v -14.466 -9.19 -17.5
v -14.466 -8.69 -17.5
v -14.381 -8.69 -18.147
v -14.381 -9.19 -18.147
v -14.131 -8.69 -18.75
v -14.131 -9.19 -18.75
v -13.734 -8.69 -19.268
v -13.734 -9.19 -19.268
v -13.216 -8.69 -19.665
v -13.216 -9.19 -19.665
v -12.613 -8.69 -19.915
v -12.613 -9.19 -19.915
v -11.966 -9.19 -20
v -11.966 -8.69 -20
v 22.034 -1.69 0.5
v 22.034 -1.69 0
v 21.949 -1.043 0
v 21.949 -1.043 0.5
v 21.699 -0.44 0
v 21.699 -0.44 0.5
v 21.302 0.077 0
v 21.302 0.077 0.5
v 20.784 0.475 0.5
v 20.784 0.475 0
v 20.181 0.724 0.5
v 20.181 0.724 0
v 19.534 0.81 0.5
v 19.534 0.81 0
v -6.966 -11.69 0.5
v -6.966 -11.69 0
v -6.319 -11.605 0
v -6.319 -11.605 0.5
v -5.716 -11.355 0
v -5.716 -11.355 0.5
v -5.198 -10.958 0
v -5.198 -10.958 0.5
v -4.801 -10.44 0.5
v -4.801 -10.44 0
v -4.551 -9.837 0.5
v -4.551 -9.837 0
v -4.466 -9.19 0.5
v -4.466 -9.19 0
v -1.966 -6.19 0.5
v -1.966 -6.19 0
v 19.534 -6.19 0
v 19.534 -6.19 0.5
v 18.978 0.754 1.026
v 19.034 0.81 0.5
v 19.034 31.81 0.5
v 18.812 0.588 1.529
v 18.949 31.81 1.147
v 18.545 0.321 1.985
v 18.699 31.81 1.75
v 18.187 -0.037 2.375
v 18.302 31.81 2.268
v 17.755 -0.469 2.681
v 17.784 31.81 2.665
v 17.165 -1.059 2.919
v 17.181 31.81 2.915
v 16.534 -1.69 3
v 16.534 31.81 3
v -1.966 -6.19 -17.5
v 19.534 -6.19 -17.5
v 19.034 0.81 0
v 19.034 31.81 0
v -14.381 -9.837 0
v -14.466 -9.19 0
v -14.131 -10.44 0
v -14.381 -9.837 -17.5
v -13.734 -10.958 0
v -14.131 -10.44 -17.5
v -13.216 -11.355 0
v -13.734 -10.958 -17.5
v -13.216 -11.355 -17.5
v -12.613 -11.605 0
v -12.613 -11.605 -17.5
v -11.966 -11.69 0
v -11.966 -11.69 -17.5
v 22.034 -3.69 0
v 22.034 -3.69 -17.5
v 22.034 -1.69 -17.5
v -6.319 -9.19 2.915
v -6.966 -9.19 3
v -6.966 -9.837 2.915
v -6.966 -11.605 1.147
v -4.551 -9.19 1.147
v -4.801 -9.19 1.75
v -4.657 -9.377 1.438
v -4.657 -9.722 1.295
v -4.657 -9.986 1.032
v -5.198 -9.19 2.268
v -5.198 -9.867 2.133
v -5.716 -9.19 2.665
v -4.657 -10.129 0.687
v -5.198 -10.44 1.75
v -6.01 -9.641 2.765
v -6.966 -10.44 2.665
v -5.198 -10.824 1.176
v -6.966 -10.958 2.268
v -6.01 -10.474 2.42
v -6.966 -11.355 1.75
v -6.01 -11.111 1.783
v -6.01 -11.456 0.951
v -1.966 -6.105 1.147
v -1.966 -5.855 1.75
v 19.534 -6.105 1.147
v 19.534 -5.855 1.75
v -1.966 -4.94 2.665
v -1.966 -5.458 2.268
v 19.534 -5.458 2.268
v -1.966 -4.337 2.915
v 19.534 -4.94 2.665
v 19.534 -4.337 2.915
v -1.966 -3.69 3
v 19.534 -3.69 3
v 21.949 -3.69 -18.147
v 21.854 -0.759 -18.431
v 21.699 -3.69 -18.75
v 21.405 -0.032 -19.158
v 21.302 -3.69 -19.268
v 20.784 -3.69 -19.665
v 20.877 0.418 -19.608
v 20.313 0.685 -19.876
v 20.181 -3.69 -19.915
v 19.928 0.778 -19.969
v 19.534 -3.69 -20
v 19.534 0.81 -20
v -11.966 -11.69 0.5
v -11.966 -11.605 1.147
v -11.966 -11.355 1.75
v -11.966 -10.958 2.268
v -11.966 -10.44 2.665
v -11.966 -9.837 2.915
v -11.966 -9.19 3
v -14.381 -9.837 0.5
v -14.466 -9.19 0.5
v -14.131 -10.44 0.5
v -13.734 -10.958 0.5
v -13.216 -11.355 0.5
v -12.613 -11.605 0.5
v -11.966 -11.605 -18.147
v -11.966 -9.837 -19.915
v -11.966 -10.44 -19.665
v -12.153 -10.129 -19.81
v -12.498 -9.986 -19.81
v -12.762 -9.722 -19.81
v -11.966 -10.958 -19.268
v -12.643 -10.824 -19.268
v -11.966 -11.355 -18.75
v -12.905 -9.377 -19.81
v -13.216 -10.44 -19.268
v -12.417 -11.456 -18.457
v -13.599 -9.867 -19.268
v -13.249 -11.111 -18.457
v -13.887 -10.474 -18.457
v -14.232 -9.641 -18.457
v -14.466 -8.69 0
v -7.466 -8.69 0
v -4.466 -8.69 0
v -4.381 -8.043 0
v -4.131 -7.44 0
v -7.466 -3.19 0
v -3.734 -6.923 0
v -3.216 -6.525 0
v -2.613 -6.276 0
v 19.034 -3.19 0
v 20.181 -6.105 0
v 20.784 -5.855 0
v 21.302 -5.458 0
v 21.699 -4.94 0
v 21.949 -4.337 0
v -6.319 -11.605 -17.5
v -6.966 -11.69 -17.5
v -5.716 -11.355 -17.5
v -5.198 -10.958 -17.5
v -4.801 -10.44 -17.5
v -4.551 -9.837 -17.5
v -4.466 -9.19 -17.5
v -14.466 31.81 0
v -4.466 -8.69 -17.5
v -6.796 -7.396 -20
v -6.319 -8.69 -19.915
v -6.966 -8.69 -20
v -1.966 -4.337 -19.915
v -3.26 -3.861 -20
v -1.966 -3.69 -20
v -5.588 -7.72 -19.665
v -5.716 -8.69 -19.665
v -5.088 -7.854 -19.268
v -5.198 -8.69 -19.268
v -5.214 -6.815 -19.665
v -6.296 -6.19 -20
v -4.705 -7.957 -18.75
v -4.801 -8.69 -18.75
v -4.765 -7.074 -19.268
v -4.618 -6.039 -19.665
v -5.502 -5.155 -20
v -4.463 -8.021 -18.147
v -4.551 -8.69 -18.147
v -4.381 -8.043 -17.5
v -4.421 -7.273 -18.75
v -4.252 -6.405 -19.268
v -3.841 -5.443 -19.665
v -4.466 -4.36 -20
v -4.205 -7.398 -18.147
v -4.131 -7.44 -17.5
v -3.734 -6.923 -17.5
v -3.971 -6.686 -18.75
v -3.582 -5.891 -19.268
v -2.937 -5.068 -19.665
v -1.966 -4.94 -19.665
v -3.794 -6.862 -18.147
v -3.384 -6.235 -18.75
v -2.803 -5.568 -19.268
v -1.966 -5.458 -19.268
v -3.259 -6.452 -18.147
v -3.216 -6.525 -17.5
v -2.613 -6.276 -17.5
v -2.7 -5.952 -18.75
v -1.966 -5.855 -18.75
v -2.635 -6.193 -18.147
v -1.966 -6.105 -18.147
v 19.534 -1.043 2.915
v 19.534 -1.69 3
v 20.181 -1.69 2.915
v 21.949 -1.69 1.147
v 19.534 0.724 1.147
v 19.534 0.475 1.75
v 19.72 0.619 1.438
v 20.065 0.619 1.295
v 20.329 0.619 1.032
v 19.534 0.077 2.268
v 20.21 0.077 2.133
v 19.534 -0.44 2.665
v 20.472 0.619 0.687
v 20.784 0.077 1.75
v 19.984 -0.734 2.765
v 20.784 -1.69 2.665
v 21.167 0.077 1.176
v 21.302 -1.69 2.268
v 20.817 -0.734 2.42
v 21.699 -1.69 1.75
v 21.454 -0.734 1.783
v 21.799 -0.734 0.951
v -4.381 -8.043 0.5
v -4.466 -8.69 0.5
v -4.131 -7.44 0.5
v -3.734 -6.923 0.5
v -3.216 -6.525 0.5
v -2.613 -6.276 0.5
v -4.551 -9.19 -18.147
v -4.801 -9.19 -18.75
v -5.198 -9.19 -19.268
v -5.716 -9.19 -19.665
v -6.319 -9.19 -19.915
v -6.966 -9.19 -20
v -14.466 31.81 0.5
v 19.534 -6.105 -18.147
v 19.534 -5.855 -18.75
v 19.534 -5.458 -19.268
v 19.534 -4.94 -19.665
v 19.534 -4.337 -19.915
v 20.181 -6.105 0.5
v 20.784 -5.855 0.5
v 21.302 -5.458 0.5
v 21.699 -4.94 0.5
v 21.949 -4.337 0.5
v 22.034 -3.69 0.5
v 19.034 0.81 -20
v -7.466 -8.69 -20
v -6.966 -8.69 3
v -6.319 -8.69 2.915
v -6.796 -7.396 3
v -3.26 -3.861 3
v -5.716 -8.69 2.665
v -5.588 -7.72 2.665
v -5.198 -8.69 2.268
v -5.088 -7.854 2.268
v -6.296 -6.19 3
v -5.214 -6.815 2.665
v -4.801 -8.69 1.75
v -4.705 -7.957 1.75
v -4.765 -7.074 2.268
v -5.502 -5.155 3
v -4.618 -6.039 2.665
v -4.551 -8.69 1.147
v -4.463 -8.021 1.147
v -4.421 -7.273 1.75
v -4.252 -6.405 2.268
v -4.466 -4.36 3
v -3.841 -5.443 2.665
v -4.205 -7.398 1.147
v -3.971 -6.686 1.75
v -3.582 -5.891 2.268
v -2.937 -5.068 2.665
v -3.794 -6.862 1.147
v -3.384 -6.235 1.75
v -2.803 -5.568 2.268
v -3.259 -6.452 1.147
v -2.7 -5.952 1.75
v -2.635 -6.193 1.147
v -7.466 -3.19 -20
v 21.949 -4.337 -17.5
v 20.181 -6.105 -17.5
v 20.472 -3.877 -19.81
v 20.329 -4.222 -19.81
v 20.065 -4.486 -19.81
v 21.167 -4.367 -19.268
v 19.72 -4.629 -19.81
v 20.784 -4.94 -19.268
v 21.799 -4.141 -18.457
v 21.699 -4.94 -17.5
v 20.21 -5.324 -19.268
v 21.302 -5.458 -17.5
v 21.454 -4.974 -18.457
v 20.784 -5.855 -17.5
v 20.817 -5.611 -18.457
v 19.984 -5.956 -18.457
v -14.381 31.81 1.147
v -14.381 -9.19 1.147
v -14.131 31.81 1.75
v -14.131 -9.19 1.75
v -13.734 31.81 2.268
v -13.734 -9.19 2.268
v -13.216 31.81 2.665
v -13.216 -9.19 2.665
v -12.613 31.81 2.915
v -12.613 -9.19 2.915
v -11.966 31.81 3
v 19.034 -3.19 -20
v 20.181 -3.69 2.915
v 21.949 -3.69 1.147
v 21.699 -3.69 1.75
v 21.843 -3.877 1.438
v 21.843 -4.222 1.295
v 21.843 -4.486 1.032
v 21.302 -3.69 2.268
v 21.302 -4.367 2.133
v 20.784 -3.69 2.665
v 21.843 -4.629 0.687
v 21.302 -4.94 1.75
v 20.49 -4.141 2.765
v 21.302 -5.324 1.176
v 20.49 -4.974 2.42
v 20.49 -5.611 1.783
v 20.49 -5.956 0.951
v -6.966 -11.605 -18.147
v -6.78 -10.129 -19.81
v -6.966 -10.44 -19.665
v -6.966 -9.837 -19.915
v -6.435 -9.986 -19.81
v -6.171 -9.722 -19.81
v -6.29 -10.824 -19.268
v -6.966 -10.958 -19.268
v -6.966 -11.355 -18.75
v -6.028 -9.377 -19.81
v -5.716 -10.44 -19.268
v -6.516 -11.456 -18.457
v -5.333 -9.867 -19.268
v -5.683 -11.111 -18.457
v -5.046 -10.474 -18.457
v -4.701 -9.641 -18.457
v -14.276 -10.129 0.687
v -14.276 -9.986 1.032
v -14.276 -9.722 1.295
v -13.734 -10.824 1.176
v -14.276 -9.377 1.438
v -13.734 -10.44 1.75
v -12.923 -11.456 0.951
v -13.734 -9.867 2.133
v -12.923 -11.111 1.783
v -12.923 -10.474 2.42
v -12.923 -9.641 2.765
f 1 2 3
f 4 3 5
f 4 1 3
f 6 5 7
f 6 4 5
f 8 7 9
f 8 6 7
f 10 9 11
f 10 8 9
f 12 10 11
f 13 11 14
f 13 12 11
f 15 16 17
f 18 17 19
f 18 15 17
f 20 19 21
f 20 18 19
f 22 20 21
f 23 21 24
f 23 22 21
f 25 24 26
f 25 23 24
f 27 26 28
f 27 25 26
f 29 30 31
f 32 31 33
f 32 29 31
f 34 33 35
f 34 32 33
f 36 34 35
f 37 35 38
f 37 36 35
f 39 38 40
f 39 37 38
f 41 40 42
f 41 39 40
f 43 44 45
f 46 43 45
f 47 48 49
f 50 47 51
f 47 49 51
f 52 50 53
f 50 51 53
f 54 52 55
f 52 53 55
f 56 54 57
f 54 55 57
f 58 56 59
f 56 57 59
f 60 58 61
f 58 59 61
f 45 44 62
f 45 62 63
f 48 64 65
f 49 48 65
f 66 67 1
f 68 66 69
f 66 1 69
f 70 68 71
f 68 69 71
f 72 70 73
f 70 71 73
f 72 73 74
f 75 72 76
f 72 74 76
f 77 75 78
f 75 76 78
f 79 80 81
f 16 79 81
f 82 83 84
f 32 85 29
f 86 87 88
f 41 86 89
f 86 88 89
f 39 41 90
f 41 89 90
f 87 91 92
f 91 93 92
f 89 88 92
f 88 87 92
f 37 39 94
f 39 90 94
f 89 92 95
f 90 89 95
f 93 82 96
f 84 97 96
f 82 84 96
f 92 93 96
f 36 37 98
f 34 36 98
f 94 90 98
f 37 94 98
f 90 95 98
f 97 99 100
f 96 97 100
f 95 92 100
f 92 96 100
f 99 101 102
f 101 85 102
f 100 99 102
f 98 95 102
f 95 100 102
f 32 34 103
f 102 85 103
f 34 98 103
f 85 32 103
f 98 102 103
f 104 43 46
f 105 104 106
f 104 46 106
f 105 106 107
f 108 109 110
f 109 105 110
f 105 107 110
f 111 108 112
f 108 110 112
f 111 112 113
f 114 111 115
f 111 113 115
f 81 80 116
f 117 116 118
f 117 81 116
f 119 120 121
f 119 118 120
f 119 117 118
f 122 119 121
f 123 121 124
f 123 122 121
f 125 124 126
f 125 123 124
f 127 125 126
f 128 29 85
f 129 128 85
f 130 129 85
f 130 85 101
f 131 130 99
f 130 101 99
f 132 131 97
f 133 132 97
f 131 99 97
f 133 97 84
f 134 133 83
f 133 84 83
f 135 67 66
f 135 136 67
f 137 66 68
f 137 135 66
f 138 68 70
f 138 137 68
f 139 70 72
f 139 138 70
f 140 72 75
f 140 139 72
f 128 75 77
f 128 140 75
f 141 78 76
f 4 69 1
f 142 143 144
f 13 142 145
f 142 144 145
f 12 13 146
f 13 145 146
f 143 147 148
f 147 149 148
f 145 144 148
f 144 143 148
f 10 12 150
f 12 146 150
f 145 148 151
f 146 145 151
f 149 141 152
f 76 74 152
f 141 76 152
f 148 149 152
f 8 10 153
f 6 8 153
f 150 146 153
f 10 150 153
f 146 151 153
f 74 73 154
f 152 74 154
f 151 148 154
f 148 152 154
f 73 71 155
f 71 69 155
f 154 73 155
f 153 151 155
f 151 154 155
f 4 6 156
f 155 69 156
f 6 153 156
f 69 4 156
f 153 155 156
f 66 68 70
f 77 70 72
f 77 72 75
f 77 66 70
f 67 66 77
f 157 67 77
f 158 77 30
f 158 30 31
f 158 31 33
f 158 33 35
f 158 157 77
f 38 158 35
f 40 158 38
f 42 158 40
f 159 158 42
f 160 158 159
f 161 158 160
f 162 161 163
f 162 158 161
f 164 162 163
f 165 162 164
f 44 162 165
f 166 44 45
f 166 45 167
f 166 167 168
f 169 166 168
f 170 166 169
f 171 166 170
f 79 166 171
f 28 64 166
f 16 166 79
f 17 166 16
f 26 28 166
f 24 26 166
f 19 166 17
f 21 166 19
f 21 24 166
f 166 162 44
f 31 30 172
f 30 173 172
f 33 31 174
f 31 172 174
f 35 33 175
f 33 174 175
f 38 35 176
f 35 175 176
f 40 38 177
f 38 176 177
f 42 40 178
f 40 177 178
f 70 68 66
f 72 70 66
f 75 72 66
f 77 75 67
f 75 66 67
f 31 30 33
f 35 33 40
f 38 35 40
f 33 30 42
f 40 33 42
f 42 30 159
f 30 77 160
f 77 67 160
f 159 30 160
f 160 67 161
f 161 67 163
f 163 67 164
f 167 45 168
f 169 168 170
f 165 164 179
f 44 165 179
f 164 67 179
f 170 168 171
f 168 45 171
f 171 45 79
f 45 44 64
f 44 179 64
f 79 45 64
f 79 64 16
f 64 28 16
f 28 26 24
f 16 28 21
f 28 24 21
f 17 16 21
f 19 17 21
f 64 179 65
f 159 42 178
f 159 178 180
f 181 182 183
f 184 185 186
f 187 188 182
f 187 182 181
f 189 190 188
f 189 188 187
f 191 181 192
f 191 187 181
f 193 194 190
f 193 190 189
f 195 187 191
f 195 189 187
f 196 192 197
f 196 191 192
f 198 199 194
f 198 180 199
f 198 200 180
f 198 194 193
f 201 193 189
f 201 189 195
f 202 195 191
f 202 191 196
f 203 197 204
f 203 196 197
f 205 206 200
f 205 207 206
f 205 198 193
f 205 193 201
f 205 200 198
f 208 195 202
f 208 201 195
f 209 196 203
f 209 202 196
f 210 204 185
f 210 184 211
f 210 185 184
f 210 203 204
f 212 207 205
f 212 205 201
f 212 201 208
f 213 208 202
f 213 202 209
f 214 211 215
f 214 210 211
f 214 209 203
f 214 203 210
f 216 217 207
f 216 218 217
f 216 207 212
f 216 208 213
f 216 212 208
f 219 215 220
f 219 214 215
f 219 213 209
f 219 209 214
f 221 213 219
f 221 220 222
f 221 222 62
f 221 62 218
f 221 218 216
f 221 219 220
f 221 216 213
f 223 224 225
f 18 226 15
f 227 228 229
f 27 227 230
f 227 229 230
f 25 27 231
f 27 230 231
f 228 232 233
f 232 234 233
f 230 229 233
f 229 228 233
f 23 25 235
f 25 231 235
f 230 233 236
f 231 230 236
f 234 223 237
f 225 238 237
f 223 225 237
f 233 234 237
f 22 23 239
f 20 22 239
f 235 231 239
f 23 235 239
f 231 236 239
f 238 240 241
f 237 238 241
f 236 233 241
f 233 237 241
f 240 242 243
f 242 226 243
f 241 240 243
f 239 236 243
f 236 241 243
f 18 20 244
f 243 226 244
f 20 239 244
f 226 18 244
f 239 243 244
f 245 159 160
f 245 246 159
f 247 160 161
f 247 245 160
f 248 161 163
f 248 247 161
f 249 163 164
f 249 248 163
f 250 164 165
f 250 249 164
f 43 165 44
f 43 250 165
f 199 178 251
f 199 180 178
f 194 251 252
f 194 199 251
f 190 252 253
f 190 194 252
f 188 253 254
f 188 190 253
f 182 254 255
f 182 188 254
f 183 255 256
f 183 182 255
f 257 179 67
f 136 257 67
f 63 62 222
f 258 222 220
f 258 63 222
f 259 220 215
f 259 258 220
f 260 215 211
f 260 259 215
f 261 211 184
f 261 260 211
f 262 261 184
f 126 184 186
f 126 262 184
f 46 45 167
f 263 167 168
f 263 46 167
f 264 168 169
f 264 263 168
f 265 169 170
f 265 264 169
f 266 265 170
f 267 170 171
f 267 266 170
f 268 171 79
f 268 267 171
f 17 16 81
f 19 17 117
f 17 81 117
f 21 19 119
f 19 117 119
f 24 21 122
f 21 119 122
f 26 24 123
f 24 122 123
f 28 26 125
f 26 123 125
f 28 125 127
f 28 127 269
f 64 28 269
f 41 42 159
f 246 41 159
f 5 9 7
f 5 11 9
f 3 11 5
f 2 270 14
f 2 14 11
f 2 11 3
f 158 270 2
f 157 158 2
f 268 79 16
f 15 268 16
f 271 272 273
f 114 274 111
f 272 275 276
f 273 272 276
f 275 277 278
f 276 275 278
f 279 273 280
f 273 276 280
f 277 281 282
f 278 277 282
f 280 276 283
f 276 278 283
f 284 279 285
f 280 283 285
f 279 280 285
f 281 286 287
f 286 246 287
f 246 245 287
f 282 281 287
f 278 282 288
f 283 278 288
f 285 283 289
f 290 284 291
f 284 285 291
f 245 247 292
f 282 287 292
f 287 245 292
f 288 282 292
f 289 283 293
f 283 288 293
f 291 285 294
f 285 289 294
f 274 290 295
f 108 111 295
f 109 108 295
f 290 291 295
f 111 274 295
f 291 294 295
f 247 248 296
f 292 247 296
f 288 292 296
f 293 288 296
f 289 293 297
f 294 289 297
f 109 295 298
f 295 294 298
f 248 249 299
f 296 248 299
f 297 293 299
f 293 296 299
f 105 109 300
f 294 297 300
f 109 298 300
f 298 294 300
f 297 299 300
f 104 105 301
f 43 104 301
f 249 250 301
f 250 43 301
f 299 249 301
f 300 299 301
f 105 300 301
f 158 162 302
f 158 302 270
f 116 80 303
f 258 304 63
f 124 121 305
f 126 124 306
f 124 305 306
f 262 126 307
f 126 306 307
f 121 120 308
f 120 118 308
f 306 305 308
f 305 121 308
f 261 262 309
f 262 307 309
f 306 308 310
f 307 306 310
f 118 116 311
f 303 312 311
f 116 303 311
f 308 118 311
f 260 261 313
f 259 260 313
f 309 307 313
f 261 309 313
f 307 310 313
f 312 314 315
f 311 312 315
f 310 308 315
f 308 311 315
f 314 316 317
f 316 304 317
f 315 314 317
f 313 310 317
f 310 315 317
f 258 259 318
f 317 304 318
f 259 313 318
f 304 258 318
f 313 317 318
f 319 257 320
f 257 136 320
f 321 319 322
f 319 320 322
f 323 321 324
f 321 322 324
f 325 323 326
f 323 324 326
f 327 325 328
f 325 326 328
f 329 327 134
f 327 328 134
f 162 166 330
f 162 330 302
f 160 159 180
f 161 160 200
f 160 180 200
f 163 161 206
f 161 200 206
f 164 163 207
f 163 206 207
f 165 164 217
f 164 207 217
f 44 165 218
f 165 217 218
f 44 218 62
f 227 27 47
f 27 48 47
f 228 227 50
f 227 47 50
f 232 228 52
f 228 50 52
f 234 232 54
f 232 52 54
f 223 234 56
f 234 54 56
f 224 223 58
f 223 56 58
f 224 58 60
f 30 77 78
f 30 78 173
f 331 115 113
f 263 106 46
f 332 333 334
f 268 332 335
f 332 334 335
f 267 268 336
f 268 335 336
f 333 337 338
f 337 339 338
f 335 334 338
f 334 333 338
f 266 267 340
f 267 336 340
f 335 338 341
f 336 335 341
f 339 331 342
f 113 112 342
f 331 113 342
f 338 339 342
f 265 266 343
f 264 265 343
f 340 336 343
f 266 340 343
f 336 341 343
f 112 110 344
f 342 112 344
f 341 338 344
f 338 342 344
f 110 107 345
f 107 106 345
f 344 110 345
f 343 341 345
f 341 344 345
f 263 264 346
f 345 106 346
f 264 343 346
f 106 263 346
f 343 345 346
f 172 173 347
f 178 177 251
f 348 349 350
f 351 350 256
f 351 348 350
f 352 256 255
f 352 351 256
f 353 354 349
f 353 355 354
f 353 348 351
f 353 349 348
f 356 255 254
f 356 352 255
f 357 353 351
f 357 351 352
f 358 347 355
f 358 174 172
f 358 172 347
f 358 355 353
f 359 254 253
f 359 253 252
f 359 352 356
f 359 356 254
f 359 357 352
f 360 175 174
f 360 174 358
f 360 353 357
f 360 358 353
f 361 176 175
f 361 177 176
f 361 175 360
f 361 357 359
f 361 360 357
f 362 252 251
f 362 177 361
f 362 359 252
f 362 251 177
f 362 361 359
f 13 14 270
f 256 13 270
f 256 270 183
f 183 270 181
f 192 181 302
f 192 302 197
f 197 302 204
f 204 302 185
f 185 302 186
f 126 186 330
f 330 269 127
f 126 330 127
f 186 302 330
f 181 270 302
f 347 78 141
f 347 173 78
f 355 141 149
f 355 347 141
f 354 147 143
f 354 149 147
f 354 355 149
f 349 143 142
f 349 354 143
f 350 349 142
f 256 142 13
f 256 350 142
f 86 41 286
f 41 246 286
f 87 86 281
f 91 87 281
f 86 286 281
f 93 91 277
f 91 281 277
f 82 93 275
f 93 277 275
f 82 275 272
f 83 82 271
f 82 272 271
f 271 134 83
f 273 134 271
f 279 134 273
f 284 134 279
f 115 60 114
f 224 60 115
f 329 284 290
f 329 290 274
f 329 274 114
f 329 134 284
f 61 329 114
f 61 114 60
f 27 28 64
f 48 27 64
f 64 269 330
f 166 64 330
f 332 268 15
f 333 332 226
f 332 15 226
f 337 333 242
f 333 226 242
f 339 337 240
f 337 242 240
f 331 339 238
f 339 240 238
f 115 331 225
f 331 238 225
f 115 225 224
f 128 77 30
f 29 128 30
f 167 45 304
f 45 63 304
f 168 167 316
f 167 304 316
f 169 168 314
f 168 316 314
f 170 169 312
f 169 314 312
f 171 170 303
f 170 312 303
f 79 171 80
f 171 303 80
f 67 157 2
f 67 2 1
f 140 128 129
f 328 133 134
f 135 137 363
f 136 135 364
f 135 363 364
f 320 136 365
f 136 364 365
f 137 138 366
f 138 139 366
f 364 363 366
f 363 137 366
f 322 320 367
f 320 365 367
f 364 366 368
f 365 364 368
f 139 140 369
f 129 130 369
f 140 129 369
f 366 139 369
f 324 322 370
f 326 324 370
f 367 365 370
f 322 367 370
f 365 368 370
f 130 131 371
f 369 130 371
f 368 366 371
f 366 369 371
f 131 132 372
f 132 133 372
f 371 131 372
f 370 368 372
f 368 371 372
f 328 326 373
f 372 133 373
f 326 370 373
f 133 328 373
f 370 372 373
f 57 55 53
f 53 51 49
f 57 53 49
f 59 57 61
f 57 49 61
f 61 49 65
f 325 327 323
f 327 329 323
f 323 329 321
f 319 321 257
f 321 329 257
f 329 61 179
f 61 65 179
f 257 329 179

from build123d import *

# Parameters (mm, degrees)
F0_W     = 23.5
F0_H     = 3
F1_DEPTH = 3
F2_DEPTH = 20
F3_R     = 2.5
F3_2_R   = 2.5


with BuildPart() as f1:
    # F0 (on Top) → F1 (new body)
    with BuildSketch(Plane.XY):
        Polygon((-14.4662116915, 31.8095687255), (-14.4662116915, -8.6904312745), (-7.4662116915, -8.6904312745), (-7.4662116915, -3.1904312745), (-4.4662116915, -3.1904312745), (19.0337883085, -3.1904312745), (19.0337883085, 0.8095687255), (19.0337883085, 31.8095687255), align=None)
        Polygon((-7.4662116915, -8.6904312745), (-14.4662116915, -8.6904312745), (-14.4662116915, -11.6904312745), (-7.4662116915, -11.6904312745), (-4.4662116915, -11.6904312745), (-4.4662116915, -6.1904312745), (-4.4662116915, -3.1904312745), (-7.4662116915, -3.1904312745), align=None)
        with Locations((7.2837883085, -4.6904312745)):
            Rectangle(F0_W, F0_H)
        Polygon((22.0337883085, 0.8095687255), (19.0337883085, 0.8095687255), (19.0337883085, -3.1904312745), (19.0337883085, -6.1904312745), (22.0337883085, -6.1904312745), (22.0337883085, -3.1904312745), align=None)
    extrude(amount=F1_DEPTH)

    # F3
    f3_edges = [f1.edges().sort_by_distance(p)[0] for p in [
        (-9.466212, -11.690431, 3),
        (-4.466212, -8.940431, 3),
        (8.783788, -6.190431, 3),
        (22.033788, -2.690431, 3),
        (22.033788, -6.190431, 1.5),
        (-4.466212, -11.690431, 1.5),
        (-4.466212, -6.190431, 1.5),
        (-14.466212, -11.690431, 1.5),
        (-14.466212, 10.059569, 3),
        (20.533788, 0.809569, 3),
        (22.033788, 0.809569, 1.5),
        (19.033788, 16.309569, 3),
    ]]
    fillet(f3_edges, radius=F3_R)


with BuildPart() as f2:
    # F0 (on Top) → F2 (new body)
    with BuildSketch(Plane.XY):
        Polygon((-7.4662116915, -8.6904312745), (-14.4662116915, -8.6904312745), (-14.4662116915, -11.6904312745), (-7.4662116915, -11.6904312745), (-4.4662116915, -11.6904312745), (-4.4662116915, -6.1904312745), (-4.4662116915, -3.1904312745), (-7.4662116915, -3.1904312745), align=None)
        with Locations((7.2837883085, -4.6904312745)):
            Rectangle(F0_W, F0_H)
        Polygon((22.0337883085, 0.8095687255), (19.0337883085, 0.8095687255), (19.0337883085, -3.1904312745), (19.0337883085, -6.1904312745), (22.0337883085, -6.1904312745), (22.0337883085, -3.1904312745), align=None)
    extrude(amount=-F2_DEPTH)

    # F3#2
    f3_2_edges = [f2.edges().sort_by_distance(p)[0] for p in [
        (22.033788, -6.190431, -10),
        (-4.466212, -11.690431, -10),
        (-4.466212, -6.190431, -10),
        (-14.466212, -11.690431, -10),
        (-9.466212, -11.690431, -20),
        (-4.466212, -8.940431, -20),
        (22.033788, -2.690431, -20),
        (-14.466212, -10.190431, -20),
        (22.033788, 0.809569, -10),
        (8.783788, -6.190431, -20),
    ]]
    fillet(f3_2_edges, radius=F3_2_R)


solid = Compound([f1.part, f2.part])
